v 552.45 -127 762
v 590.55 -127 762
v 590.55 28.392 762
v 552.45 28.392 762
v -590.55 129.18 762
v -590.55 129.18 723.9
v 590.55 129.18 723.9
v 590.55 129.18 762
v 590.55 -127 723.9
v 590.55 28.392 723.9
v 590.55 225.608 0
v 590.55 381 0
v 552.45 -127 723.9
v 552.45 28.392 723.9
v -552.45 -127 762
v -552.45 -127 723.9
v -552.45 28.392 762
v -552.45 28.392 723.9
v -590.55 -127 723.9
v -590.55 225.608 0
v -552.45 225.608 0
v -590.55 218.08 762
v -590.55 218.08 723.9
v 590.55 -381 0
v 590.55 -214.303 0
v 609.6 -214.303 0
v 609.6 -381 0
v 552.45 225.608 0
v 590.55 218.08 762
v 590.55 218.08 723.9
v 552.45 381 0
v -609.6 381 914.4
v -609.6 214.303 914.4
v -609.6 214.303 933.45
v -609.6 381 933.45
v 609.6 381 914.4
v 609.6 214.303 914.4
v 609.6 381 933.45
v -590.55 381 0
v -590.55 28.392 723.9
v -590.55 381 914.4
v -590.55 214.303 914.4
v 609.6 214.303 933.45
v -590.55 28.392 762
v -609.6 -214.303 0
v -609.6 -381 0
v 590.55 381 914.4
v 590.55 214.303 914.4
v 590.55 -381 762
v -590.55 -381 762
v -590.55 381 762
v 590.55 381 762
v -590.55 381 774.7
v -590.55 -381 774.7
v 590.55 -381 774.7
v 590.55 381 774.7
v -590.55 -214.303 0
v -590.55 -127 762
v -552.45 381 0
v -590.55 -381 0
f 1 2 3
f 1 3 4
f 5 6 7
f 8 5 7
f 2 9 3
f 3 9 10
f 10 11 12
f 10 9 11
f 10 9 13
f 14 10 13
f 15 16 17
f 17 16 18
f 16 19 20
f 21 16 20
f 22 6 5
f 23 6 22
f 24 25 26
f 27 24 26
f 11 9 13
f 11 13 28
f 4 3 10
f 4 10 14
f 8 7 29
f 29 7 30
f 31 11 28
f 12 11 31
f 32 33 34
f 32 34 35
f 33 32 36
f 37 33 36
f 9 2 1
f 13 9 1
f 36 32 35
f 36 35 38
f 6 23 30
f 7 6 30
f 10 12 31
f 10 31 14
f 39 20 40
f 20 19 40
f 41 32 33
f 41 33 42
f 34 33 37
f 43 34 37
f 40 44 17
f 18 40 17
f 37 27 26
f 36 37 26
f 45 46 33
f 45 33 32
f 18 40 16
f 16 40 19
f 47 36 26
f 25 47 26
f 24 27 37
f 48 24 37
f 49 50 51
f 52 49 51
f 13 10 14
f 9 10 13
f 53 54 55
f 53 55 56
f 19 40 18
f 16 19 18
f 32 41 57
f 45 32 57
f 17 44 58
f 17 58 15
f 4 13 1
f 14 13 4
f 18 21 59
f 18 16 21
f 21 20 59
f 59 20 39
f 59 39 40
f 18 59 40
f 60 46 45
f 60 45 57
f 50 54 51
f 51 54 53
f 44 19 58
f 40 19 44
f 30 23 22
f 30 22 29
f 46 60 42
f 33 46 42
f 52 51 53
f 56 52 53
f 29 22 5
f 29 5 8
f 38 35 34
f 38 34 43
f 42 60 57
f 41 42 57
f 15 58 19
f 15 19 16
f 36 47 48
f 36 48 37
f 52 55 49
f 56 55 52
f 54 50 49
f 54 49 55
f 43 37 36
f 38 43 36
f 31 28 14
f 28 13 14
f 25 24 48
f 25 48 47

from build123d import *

# Parameters (mm, degrees)
F0_W      = 19.05
F0_H      = 762
F1_DEPTH  = 914.4
F3_DEPTH  = 1219.201
F4_W      = 1219.2
F4_H      = 166.6968156723
F5_DEPTH  = 19.05
F7_DEPTH  = 38.1
F8_W      = 38.1
F8_H      = 155.3915016532
F9_DEPTH  = 38.1
F8_W_2    = 1181.1
F8_H_2    = 88.9
F11_W     = 762
F11_H     = 12.7
F12_DEPTH = 1181.1


with BuildPart() as f1:
    # F0 (on Top) → F1 (new body)
    with BuildSketch(Plane.XY):
        with Locations((-600.075, 0)):
            Rectangle(F0_W, F0_H)
    extrude(amount=F1_DEPTH)


with BuildPart() as f1b:
    # F0 (on Top) → F1, piece 2 (new body)
    with BuildSketch(Plane.XY):
        with Locations((600.075, 0)):
            Rectangle(F0_W, F0_H)
    extrude(amount=F1_DEPTH)


with BuildPart() as f3_tool:
    # F2 (on face) → F3 (new body, through all)
    with BuildSketch(Plane.YZ.offset(609.6)):
        Polygon((381, 914.4), (-214.3031843277, 0), (381, 0), align=None)
        Polygon((-381, 0), (214.3031843277, 914.4), (-381, 914.4), align=None)
    extrude(amount=-F3_DEPTH)


with BuildPart() as f1_1:
    add(f1.part)

    # F3: cut by f3_tool
    add(f3_tool.part, mode=Mode.SUBTRACT)


with BuildPart() as f1b_1:
    add(f1b.part)

    # F3: cut by f3_tool
    add(f3_tool.part, mode=Mode.SUBTRACT)


with BuildPart() as f5:
    # F4 (on face) → F5 (new body)
    with BuildSketch(Plane.XY.offset(914.4)):
        with Locations((0, 297.6515921639)):
            Rectangle(F4_W, F4_H)
    extrude(amount=F5_DEPTH)


with BuildPart() as f7:
    # F6 (on face) → F7 (new body)
    with BuildSketch(Plane.YZ.offset(-590.55)):
        Polygon((225.6084983468, 0), (381, 0), (28.3915016532, 723.9), (-127, 723.9), align=None)
    extrude(amount=F7_DEPTH)


with BuildPart() as f9:
    # F8 (on face) → F9 (new body)
    with BuildSketch(Plane.XY.offset(723.9)):
        with Locations((-571.5, -49.3042491734)):
            Rectangle(F8_W, F8_H)
    extrude(amount=F9_DEPTH)


with BuildPart() as f9b:
    # F8 (on face) → F9, piece 2 (new body)
    with BuildSketch(Plane.XY.offset(723.9)):
        with Locations((0, 173.6300954289)):
            Rectangle(F8_W_2, F8_H_2)
    extrude(amount=F9_DEPTH)


with BuildPart() as f10_1:
    # F10: instance of F7
    add(f7.part.mirror(Plane.YZ))


with BuildPart() as f10_2:
    # F10: instance of F9
    add(f9.part.mirror(Plane.YZ))


with BuildPart() as f12:
    # F11 (on face) → F12 (new body, through all)
    with BuildSketch(Plane.YZ.offset(-590.55)):
        with Locations((0, 768.35)):
            Rectangle(F11_W, F11_H)
    extrude(amount=F12_DEPTH)


solid = Compound([f1_1.part, f1b_1.part, f5.part, f7.part, f9.part, f9b.part, f10_1.part, f10_2.part, f12.part])
